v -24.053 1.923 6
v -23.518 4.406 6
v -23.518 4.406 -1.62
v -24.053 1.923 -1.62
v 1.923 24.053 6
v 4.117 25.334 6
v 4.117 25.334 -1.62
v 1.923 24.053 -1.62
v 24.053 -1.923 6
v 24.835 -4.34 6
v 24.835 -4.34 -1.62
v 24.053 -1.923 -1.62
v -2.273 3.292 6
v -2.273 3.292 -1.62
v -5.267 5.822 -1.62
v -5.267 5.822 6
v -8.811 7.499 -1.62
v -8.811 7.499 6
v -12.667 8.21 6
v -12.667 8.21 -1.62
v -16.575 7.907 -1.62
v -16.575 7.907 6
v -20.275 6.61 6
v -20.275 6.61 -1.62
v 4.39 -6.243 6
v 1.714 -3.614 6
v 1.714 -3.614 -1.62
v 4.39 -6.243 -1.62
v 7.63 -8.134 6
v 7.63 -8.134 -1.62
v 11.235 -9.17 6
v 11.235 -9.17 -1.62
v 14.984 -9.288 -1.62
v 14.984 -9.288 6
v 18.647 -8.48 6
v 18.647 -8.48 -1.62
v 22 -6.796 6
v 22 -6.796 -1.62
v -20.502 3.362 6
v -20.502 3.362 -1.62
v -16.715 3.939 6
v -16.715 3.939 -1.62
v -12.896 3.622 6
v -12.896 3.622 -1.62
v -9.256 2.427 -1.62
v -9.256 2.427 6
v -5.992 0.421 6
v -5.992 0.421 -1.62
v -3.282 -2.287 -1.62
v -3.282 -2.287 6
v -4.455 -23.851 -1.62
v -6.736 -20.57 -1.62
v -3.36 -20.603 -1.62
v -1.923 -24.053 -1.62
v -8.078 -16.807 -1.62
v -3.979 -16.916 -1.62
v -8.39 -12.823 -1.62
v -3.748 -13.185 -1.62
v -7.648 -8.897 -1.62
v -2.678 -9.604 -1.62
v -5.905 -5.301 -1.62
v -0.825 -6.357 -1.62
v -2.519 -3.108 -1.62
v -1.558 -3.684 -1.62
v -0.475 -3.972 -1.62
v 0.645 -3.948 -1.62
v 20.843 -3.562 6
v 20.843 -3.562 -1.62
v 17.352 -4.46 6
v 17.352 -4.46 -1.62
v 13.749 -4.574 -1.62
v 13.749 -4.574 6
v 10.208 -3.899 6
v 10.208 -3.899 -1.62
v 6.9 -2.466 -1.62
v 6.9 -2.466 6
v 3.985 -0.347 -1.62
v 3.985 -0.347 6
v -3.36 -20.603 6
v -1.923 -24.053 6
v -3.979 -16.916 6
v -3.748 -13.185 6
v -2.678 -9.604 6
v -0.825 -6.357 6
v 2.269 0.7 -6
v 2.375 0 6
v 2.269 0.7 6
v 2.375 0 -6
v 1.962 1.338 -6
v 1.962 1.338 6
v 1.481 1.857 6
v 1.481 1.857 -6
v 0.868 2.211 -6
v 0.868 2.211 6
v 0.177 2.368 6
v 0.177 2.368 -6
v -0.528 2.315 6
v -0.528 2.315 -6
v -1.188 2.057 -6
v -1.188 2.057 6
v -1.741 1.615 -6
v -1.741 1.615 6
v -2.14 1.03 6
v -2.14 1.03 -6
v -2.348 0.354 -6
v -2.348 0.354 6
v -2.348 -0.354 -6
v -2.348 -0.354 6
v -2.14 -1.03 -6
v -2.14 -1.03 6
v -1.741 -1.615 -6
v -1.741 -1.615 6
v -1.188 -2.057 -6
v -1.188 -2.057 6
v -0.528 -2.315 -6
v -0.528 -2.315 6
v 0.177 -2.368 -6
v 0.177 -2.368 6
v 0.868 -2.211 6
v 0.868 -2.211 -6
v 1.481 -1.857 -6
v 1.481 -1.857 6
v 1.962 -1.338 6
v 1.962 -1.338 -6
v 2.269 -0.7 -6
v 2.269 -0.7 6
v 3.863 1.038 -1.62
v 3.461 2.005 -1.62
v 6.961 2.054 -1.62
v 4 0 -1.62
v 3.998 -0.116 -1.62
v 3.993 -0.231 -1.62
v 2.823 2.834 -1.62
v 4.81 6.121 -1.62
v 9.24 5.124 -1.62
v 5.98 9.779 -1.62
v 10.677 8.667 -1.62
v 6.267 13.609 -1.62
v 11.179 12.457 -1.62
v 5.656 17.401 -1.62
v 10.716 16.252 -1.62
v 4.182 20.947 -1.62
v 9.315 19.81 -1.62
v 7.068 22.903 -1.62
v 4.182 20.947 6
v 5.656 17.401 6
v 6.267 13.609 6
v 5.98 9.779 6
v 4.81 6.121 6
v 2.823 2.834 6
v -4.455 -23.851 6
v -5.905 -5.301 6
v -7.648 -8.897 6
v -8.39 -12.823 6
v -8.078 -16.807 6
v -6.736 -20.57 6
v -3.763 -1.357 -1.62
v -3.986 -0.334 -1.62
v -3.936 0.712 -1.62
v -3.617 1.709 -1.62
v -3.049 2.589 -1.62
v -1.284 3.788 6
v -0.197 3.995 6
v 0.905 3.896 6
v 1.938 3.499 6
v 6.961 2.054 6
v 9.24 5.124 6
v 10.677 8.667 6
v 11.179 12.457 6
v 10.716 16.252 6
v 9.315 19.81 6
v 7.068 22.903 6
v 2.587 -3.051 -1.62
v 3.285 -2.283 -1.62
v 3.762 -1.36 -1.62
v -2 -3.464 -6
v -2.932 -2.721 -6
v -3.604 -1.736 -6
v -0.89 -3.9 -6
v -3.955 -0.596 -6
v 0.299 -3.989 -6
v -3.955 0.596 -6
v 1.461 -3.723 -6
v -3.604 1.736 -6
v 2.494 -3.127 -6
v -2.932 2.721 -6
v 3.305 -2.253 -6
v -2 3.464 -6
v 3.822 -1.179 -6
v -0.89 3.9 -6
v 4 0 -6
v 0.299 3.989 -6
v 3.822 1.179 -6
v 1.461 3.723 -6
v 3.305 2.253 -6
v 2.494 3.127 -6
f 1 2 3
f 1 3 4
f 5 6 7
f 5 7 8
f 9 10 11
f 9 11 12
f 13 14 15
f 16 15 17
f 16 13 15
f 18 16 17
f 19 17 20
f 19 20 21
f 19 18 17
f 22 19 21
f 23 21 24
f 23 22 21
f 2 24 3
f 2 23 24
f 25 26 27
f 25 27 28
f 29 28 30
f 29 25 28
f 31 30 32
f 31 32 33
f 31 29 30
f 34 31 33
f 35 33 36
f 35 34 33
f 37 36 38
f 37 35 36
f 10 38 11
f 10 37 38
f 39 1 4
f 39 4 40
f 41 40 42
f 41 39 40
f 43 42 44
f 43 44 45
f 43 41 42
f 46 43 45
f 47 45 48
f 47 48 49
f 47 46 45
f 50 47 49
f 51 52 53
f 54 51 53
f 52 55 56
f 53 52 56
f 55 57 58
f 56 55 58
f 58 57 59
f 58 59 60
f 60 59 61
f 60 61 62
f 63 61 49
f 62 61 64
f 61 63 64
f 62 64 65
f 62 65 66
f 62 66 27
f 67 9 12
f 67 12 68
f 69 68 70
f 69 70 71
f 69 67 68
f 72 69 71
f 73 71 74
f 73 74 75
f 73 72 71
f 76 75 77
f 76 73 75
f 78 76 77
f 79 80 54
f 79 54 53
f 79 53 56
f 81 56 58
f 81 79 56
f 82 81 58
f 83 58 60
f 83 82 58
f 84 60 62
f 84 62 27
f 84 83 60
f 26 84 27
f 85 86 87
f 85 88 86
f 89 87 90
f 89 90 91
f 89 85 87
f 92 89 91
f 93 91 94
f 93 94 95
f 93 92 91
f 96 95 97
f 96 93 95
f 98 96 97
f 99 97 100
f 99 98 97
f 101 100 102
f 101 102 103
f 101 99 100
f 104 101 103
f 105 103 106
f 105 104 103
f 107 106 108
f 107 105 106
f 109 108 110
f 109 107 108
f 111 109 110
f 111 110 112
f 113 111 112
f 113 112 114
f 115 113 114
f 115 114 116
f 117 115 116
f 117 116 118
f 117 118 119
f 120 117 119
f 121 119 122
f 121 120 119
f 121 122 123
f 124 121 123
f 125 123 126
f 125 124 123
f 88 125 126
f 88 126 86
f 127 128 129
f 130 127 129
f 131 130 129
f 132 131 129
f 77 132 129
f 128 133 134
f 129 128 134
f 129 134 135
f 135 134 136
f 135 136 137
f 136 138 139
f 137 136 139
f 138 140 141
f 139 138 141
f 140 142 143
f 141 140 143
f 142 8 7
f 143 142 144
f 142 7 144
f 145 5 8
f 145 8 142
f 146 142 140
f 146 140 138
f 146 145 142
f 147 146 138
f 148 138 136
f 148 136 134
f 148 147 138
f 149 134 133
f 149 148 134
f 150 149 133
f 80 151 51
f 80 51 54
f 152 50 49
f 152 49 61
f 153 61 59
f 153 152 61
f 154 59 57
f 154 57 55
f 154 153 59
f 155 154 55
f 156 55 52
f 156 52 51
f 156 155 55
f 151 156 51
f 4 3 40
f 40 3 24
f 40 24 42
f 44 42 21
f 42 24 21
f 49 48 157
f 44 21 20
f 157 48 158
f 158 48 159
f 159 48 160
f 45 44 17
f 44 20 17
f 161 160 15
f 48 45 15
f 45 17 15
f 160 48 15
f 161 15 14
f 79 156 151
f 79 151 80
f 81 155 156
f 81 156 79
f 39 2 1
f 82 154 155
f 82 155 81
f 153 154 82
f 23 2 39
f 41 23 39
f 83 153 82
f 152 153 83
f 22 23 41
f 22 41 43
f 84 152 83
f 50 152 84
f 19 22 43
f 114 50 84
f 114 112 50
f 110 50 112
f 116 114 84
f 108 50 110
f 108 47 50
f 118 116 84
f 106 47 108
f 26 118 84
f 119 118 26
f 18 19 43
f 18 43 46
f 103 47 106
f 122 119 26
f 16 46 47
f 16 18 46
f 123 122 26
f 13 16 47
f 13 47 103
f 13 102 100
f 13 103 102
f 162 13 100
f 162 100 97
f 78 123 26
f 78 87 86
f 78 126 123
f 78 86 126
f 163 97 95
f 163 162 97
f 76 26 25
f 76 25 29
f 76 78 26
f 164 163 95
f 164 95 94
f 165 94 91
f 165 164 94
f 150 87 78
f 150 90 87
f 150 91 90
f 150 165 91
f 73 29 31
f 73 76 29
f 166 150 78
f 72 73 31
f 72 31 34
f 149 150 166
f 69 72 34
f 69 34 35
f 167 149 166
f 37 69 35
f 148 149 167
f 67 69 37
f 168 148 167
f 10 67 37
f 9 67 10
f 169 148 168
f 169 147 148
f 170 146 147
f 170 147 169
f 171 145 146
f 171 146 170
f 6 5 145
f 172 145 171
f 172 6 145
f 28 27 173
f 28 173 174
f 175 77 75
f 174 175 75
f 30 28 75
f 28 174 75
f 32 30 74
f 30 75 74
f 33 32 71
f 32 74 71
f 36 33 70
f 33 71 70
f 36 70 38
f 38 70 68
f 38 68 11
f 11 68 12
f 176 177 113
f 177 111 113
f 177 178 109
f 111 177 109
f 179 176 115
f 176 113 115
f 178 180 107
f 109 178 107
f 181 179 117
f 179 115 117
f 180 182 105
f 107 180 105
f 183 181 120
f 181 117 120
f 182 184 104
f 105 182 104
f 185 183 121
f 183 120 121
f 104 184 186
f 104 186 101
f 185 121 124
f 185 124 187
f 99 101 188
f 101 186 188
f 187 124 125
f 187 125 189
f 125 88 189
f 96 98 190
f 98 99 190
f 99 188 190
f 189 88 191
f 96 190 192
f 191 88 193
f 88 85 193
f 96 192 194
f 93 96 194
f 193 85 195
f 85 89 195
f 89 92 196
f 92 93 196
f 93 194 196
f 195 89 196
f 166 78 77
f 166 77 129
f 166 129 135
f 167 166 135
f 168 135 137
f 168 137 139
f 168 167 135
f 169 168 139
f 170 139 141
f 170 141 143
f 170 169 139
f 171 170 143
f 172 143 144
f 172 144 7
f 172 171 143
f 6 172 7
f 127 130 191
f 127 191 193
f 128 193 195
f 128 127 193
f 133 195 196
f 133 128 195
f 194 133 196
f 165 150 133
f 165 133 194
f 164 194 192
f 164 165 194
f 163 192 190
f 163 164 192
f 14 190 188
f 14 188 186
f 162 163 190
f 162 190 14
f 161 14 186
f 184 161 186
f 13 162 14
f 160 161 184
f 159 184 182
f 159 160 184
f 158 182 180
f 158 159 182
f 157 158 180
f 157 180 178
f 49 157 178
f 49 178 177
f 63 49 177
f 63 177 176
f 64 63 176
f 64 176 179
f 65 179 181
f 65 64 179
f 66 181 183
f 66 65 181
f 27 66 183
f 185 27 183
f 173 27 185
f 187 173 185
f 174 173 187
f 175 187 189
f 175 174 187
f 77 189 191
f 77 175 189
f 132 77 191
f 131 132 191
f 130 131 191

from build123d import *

# Parameters (mm, degrees)
F0_R     = 4
F0_R_2   = 2.375
F1_DEPTH = 6
F3_DEPTH = 7.62


with BuildPart() as f1:
    # F0 (on Top) → F1 (new body, symmetric)
    with BuildSketch(Plane.XY):
        Circle(F0_R)
        Circle(F0_R_2, mode=Mode.SUBTRACT)
    extrude(amount=F1_DEPTH, both=True)

    # F2 (on face) → F3 (join)
    with BuildSketch(Plane.XY.offset(6)):
        with BuildLine():
            ThreePointArc((-1.9231746538, -24.0532388516), (-3.7478638442, -13.1853053628), (1.7141412384, -3.614100139))
            ThreePointArc((1.7141412384, -3.614100139), (-1.026790754, -3.8659669874), (-3.2815280129, -2.2872634087))
            ThreePointArc((-3.2815280129, -2.2872634087), (-8.3896329921, -12.8229645422), (-4.4550945329, -23.8507994143))
            Line((-4.4550945329, -23.8507994143), (-1.9231746538, -24.0532388516))
        make_face()
        with BuildLine():
            ThreePointArc((-3.2815280129, -2.2872634087), (-3.9361819774, 0.7116680692), (-2.2728769699, 3.2915088151))
            ThreePointArc((-2.2728769699, 3.2915088151), (-12.6666400466, 8.2098960617), (-23.5180136949, 4.4061434477))
            Line((-23.5180136949, 4.4061434477), (-24.0532388516, 1.9231746538))
            ThreePointArc((-24.0532388516, 1.9231746538), (-12.8963973291, 3.6215266899), (-3.2815280129, -2.2872634087))
        make_face()
        with BuildLine():
            ThreePointArc((1.9231746538, 24.0532388516), (6.2669055314, 13.6088157667), (2.8225517459, 2.8342903241))
            ThreePointArc((2.8225517459, 2.8342903241), (3.6939279219, 1.5345672055), (4, 0))
            ThreePointArc((4, 0), (3.9962376082, -0.17345022), (3.9849575106, -0.3465741462))
            ThreePointArc((3.9849575106, -0.3465741462), (11.1793944272, 12.4572056596), (4.1165925533, 25.3340658962))
            Line((4.1165925533, 25.3340658962), (1.9231746538, 24.0532388516))
        make_face()
        with BuildLine():
            ThreePointArc((24.0532388516, -1.9231746538), (13.7489229147, -4.5738896933), (3.9849575106, -0.3465741462))
            ThreePointArc((3.9849575106, -0.3465741462), (3.2846785483, -2.2827366984), (1.7141412384, -3.614100139))
            ThreePointArc((1.7141412384, -3.614100139), (13.1058972443, -9.3455478814), (24.8347379439, -4.3399616053))
            Line((24.8347379439, -4.3399616053), (24.0532388516, -1.9231746538))
        make_face()
    extrude(amount=-F3_DEPTH)


solid = f1.part
